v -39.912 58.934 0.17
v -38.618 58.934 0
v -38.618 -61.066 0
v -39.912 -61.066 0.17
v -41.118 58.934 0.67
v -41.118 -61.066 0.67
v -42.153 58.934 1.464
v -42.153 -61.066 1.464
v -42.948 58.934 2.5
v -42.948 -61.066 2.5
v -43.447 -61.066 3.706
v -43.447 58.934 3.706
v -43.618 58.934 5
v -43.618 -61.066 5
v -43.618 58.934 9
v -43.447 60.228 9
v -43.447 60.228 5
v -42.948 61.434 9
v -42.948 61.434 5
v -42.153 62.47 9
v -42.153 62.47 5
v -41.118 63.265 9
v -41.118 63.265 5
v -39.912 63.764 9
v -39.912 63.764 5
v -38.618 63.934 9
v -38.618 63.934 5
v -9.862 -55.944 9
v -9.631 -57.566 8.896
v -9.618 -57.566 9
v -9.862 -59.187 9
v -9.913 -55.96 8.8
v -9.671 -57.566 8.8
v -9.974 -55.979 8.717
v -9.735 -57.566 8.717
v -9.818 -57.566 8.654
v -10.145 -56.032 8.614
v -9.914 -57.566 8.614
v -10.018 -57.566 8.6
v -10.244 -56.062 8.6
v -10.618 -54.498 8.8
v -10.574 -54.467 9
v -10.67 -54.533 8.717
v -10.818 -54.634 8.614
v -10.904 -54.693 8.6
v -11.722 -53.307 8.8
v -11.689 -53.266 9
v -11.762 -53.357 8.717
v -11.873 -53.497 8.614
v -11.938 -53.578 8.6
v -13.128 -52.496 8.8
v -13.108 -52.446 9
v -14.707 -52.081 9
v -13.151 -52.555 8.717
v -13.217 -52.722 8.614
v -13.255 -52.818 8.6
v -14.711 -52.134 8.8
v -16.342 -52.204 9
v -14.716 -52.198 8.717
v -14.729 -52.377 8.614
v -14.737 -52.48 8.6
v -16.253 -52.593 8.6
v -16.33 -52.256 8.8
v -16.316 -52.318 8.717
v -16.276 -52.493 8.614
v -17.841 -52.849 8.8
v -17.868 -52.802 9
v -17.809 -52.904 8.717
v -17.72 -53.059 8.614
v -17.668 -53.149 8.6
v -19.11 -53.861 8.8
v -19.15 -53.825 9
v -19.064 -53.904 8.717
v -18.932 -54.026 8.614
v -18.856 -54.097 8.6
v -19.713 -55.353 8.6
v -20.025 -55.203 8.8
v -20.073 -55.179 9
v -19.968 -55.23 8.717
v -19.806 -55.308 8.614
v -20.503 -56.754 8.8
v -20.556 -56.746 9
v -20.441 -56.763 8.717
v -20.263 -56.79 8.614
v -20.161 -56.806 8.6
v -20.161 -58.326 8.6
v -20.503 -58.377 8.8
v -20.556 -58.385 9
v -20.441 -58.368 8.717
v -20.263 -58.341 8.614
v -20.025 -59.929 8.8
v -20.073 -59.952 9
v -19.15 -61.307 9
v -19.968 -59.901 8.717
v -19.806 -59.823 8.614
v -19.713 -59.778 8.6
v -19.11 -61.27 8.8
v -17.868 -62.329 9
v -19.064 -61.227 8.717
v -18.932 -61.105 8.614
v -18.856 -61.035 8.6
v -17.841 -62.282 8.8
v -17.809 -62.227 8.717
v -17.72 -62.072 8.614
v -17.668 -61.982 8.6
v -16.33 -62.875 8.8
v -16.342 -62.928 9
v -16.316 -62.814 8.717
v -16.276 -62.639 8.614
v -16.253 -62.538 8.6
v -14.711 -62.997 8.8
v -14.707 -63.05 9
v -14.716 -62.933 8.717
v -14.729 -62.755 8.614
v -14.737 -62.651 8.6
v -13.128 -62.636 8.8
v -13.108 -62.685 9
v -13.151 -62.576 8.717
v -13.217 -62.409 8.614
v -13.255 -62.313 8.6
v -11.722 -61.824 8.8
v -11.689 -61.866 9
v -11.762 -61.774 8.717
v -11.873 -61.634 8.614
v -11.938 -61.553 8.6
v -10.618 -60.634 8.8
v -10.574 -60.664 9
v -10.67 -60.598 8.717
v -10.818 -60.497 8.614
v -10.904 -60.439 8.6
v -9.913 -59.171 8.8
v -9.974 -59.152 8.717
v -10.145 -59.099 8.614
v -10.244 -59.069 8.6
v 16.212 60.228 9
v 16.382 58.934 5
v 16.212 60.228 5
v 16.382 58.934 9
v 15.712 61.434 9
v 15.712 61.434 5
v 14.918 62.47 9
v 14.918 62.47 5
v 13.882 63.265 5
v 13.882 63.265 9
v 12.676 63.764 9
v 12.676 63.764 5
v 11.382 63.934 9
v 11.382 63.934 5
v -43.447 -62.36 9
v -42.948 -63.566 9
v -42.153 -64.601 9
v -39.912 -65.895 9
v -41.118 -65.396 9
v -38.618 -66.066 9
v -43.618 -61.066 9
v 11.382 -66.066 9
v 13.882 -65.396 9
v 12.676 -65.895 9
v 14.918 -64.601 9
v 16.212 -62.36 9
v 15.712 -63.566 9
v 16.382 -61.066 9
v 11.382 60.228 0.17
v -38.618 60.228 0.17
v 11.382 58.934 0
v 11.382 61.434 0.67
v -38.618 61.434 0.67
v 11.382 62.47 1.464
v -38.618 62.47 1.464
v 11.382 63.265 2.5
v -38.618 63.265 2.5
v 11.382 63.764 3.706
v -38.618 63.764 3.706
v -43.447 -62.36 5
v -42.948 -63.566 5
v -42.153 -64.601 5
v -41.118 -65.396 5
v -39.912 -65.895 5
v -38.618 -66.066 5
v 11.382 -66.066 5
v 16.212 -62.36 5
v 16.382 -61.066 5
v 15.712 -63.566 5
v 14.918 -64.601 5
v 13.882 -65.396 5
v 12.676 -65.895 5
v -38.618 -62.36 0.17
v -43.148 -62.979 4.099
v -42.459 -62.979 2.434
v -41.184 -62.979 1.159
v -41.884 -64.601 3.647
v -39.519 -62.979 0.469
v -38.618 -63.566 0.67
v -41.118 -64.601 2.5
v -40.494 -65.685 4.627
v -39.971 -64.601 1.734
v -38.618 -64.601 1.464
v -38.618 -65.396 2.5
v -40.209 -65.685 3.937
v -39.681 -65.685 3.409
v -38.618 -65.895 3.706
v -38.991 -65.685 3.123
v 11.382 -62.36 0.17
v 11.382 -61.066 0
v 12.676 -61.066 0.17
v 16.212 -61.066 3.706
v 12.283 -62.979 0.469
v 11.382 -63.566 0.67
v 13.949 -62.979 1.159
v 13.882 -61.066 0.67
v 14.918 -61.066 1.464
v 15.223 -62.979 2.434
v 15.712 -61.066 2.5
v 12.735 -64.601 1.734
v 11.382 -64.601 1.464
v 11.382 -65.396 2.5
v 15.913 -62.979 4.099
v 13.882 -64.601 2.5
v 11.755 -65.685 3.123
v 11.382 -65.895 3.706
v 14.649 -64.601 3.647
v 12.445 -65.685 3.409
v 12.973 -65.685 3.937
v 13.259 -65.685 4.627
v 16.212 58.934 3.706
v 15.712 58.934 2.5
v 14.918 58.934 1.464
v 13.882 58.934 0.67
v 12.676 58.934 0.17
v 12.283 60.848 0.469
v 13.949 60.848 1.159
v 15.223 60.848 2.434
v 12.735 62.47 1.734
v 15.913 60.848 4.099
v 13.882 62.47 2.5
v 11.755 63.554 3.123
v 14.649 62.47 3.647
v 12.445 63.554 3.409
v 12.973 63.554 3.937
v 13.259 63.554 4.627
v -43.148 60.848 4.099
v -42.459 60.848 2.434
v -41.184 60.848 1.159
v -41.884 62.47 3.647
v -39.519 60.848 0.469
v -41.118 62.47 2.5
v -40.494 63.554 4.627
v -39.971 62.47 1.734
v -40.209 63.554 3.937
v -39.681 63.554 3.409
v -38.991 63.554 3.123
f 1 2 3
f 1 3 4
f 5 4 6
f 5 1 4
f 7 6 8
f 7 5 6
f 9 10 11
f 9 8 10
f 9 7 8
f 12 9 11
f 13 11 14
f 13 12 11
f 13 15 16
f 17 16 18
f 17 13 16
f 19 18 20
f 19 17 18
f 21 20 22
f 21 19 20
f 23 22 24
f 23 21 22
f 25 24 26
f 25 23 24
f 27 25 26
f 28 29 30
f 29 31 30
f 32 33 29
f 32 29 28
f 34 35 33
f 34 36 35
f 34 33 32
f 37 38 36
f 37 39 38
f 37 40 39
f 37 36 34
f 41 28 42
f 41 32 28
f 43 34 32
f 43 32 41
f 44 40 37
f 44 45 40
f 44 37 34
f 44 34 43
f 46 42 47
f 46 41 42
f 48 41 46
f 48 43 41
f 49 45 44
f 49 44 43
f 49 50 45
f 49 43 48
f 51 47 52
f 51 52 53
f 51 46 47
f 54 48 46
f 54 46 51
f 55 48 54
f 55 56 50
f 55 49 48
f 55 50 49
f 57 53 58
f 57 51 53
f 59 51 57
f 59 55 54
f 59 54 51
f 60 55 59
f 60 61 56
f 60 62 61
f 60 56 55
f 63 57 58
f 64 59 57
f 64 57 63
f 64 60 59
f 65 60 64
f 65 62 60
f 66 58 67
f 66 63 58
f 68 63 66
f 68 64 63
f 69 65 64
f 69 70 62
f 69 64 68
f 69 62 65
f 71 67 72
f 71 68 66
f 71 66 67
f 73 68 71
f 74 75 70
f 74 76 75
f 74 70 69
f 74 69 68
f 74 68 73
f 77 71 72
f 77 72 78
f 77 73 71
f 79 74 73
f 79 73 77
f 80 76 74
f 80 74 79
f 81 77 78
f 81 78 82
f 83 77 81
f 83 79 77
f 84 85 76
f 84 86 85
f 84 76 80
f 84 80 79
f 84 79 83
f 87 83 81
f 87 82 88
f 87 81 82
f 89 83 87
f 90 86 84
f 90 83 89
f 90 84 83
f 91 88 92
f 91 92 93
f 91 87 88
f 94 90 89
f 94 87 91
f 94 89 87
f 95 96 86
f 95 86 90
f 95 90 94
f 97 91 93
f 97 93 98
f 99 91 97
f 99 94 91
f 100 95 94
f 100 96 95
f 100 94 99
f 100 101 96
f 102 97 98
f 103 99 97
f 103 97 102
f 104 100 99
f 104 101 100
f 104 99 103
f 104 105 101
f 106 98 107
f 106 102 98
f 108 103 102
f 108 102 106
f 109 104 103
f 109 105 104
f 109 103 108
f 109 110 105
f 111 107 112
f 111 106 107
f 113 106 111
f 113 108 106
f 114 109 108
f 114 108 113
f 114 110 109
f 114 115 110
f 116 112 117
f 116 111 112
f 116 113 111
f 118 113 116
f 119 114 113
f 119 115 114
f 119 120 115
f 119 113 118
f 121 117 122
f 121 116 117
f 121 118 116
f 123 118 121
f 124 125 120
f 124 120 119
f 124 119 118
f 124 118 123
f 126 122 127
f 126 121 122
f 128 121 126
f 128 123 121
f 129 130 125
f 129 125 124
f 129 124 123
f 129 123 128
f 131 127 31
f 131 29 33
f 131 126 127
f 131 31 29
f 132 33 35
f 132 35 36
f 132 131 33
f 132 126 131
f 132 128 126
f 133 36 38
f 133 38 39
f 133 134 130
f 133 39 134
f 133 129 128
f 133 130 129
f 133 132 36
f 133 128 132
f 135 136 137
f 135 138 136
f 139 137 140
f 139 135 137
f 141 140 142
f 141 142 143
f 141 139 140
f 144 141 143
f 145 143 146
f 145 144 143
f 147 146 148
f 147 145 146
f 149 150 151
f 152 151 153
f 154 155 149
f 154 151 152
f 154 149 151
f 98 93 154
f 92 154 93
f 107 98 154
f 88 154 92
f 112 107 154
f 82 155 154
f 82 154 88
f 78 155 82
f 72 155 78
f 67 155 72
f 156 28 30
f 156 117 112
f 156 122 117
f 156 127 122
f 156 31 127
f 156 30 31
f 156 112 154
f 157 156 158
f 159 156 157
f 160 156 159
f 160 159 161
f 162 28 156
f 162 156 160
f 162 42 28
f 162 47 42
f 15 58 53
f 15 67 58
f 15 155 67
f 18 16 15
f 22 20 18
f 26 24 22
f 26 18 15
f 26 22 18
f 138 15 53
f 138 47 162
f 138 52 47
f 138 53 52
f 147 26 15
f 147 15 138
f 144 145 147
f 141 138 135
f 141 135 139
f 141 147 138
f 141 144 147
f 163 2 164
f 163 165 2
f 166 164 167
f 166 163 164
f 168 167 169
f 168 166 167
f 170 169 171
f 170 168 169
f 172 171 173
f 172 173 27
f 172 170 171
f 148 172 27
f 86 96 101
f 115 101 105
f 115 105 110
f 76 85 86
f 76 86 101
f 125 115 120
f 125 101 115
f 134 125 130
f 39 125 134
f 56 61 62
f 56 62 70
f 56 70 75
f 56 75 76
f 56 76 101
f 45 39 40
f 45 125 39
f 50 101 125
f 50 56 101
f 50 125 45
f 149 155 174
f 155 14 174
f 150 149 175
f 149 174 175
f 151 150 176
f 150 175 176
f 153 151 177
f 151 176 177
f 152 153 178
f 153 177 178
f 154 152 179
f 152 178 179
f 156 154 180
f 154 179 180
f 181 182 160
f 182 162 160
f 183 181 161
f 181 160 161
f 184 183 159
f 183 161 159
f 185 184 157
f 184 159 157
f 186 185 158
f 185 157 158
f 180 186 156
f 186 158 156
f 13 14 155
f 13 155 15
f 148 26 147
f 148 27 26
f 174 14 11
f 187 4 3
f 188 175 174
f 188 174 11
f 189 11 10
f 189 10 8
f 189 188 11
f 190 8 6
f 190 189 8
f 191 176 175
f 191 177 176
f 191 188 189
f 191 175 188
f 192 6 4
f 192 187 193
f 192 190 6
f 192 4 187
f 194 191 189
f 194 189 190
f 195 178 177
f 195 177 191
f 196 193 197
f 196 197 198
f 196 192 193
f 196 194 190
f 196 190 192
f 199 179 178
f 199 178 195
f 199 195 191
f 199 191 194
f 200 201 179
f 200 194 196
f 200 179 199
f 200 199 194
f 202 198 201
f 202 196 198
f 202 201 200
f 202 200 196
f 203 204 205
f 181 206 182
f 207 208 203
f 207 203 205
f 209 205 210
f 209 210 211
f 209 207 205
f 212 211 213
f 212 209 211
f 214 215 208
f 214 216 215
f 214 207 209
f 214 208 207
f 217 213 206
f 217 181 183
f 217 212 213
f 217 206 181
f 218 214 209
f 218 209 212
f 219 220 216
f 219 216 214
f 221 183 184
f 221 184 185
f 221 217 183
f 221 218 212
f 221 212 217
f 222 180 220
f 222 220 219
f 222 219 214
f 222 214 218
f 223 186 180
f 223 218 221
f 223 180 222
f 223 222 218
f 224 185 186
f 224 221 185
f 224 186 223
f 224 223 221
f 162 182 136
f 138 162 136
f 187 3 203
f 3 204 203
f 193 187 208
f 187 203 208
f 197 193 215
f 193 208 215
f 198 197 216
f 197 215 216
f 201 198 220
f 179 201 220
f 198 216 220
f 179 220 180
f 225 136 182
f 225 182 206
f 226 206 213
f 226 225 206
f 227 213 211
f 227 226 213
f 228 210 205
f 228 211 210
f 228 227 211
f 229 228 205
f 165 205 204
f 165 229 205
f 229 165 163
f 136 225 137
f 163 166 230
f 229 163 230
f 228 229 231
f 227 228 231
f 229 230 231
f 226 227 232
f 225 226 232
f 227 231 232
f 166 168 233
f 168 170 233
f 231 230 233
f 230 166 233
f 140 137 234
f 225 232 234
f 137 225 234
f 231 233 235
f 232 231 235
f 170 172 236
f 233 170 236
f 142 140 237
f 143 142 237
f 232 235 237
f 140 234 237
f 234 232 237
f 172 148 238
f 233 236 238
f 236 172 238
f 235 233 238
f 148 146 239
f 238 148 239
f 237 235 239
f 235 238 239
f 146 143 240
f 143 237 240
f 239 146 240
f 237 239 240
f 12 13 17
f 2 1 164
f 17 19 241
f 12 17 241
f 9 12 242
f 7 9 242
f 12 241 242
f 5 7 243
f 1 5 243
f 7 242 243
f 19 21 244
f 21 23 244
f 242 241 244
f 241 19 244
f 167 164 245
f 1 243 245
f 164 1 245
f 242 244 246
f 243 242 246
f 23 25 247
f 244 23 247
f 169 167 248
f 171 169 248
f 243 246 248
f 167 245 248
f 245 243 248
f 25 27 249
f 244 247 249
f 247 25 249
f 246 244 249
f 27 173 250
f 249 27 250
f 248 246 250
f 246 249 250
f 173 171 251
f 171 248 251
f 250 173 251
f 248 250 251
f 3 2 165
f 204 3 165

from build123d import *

# Parameters (mm, degrees)
F0_W     = 60
F0_H     = 130
F1_DEPTH = 9
F2_R     = 5
F3_R     = 5
F4_R     = 5
F5_R     = 5
F6_R     = 5.5
F7_DEPTH = 0.4
F8_R     = 0.39999


# Not quite as in the source:
# - a fillet or chamfer is up to 0.001 mm smaller than in the source, because OpenCascade refuses the exact size


with BuildPart() as f1:
    # F0 (on Top) → F1 (new body)
    with BuildSketch(Plane.XY):
        with Locations((-13.6178402903, -1.0656192899)):
            Rectangle(F0_W, F0_H)
    extrude(amount=F1_DEPTH)

    # F2
    f2_edges = [f1.edges().sort_by_distance(p)[0] for p in [
        (16.38216, -1.065619, 0),
    ]]
    fillet(f2_edges, radius=F2_R)

    # F3
    f3_edges = [f1.edges().sort_by_distance(p)[0] for p in [
        (-43.61784, -1.065619, 0),
    ]]
    fillet(f3_edges, radius=F3_R)

    # F4
    f4_edges = [f1.edges().sort_by_distance(p)[0] for p in [
        (-13.61784, 63.934381, 0),
    ]]
    fillet(f4_edges, radius=F4_R)

    # F5
    f5_edges = [f1.edges().sort_by_distance(p)[0] for p in [
        (-13.61784, -66.065619, 0),
    ]]
    fillet(f5_edges, radius=F5_R)

    # F6 (on face) → F7 (cut)
    with BuildSketch(Plane.XY.offset(9)):
        with Locations((-15.1178402903, -57.5656192899)):
            Circle(F6_R)
    extrude(amount=-F7_DEPTH, mode=Mode.SUBTRACT)

    # F8 (radius 0.4 in the source; OpenCascade refuses exactly that, so slightly less here)
    f8_edges = [f1.edges().sort_by_distance(p)[0] for p in [
        (-20.61784, -57.565619, 8.6),
    ]]
    fillet(f8_edges, radius=F8_R)


solid = f1.part
